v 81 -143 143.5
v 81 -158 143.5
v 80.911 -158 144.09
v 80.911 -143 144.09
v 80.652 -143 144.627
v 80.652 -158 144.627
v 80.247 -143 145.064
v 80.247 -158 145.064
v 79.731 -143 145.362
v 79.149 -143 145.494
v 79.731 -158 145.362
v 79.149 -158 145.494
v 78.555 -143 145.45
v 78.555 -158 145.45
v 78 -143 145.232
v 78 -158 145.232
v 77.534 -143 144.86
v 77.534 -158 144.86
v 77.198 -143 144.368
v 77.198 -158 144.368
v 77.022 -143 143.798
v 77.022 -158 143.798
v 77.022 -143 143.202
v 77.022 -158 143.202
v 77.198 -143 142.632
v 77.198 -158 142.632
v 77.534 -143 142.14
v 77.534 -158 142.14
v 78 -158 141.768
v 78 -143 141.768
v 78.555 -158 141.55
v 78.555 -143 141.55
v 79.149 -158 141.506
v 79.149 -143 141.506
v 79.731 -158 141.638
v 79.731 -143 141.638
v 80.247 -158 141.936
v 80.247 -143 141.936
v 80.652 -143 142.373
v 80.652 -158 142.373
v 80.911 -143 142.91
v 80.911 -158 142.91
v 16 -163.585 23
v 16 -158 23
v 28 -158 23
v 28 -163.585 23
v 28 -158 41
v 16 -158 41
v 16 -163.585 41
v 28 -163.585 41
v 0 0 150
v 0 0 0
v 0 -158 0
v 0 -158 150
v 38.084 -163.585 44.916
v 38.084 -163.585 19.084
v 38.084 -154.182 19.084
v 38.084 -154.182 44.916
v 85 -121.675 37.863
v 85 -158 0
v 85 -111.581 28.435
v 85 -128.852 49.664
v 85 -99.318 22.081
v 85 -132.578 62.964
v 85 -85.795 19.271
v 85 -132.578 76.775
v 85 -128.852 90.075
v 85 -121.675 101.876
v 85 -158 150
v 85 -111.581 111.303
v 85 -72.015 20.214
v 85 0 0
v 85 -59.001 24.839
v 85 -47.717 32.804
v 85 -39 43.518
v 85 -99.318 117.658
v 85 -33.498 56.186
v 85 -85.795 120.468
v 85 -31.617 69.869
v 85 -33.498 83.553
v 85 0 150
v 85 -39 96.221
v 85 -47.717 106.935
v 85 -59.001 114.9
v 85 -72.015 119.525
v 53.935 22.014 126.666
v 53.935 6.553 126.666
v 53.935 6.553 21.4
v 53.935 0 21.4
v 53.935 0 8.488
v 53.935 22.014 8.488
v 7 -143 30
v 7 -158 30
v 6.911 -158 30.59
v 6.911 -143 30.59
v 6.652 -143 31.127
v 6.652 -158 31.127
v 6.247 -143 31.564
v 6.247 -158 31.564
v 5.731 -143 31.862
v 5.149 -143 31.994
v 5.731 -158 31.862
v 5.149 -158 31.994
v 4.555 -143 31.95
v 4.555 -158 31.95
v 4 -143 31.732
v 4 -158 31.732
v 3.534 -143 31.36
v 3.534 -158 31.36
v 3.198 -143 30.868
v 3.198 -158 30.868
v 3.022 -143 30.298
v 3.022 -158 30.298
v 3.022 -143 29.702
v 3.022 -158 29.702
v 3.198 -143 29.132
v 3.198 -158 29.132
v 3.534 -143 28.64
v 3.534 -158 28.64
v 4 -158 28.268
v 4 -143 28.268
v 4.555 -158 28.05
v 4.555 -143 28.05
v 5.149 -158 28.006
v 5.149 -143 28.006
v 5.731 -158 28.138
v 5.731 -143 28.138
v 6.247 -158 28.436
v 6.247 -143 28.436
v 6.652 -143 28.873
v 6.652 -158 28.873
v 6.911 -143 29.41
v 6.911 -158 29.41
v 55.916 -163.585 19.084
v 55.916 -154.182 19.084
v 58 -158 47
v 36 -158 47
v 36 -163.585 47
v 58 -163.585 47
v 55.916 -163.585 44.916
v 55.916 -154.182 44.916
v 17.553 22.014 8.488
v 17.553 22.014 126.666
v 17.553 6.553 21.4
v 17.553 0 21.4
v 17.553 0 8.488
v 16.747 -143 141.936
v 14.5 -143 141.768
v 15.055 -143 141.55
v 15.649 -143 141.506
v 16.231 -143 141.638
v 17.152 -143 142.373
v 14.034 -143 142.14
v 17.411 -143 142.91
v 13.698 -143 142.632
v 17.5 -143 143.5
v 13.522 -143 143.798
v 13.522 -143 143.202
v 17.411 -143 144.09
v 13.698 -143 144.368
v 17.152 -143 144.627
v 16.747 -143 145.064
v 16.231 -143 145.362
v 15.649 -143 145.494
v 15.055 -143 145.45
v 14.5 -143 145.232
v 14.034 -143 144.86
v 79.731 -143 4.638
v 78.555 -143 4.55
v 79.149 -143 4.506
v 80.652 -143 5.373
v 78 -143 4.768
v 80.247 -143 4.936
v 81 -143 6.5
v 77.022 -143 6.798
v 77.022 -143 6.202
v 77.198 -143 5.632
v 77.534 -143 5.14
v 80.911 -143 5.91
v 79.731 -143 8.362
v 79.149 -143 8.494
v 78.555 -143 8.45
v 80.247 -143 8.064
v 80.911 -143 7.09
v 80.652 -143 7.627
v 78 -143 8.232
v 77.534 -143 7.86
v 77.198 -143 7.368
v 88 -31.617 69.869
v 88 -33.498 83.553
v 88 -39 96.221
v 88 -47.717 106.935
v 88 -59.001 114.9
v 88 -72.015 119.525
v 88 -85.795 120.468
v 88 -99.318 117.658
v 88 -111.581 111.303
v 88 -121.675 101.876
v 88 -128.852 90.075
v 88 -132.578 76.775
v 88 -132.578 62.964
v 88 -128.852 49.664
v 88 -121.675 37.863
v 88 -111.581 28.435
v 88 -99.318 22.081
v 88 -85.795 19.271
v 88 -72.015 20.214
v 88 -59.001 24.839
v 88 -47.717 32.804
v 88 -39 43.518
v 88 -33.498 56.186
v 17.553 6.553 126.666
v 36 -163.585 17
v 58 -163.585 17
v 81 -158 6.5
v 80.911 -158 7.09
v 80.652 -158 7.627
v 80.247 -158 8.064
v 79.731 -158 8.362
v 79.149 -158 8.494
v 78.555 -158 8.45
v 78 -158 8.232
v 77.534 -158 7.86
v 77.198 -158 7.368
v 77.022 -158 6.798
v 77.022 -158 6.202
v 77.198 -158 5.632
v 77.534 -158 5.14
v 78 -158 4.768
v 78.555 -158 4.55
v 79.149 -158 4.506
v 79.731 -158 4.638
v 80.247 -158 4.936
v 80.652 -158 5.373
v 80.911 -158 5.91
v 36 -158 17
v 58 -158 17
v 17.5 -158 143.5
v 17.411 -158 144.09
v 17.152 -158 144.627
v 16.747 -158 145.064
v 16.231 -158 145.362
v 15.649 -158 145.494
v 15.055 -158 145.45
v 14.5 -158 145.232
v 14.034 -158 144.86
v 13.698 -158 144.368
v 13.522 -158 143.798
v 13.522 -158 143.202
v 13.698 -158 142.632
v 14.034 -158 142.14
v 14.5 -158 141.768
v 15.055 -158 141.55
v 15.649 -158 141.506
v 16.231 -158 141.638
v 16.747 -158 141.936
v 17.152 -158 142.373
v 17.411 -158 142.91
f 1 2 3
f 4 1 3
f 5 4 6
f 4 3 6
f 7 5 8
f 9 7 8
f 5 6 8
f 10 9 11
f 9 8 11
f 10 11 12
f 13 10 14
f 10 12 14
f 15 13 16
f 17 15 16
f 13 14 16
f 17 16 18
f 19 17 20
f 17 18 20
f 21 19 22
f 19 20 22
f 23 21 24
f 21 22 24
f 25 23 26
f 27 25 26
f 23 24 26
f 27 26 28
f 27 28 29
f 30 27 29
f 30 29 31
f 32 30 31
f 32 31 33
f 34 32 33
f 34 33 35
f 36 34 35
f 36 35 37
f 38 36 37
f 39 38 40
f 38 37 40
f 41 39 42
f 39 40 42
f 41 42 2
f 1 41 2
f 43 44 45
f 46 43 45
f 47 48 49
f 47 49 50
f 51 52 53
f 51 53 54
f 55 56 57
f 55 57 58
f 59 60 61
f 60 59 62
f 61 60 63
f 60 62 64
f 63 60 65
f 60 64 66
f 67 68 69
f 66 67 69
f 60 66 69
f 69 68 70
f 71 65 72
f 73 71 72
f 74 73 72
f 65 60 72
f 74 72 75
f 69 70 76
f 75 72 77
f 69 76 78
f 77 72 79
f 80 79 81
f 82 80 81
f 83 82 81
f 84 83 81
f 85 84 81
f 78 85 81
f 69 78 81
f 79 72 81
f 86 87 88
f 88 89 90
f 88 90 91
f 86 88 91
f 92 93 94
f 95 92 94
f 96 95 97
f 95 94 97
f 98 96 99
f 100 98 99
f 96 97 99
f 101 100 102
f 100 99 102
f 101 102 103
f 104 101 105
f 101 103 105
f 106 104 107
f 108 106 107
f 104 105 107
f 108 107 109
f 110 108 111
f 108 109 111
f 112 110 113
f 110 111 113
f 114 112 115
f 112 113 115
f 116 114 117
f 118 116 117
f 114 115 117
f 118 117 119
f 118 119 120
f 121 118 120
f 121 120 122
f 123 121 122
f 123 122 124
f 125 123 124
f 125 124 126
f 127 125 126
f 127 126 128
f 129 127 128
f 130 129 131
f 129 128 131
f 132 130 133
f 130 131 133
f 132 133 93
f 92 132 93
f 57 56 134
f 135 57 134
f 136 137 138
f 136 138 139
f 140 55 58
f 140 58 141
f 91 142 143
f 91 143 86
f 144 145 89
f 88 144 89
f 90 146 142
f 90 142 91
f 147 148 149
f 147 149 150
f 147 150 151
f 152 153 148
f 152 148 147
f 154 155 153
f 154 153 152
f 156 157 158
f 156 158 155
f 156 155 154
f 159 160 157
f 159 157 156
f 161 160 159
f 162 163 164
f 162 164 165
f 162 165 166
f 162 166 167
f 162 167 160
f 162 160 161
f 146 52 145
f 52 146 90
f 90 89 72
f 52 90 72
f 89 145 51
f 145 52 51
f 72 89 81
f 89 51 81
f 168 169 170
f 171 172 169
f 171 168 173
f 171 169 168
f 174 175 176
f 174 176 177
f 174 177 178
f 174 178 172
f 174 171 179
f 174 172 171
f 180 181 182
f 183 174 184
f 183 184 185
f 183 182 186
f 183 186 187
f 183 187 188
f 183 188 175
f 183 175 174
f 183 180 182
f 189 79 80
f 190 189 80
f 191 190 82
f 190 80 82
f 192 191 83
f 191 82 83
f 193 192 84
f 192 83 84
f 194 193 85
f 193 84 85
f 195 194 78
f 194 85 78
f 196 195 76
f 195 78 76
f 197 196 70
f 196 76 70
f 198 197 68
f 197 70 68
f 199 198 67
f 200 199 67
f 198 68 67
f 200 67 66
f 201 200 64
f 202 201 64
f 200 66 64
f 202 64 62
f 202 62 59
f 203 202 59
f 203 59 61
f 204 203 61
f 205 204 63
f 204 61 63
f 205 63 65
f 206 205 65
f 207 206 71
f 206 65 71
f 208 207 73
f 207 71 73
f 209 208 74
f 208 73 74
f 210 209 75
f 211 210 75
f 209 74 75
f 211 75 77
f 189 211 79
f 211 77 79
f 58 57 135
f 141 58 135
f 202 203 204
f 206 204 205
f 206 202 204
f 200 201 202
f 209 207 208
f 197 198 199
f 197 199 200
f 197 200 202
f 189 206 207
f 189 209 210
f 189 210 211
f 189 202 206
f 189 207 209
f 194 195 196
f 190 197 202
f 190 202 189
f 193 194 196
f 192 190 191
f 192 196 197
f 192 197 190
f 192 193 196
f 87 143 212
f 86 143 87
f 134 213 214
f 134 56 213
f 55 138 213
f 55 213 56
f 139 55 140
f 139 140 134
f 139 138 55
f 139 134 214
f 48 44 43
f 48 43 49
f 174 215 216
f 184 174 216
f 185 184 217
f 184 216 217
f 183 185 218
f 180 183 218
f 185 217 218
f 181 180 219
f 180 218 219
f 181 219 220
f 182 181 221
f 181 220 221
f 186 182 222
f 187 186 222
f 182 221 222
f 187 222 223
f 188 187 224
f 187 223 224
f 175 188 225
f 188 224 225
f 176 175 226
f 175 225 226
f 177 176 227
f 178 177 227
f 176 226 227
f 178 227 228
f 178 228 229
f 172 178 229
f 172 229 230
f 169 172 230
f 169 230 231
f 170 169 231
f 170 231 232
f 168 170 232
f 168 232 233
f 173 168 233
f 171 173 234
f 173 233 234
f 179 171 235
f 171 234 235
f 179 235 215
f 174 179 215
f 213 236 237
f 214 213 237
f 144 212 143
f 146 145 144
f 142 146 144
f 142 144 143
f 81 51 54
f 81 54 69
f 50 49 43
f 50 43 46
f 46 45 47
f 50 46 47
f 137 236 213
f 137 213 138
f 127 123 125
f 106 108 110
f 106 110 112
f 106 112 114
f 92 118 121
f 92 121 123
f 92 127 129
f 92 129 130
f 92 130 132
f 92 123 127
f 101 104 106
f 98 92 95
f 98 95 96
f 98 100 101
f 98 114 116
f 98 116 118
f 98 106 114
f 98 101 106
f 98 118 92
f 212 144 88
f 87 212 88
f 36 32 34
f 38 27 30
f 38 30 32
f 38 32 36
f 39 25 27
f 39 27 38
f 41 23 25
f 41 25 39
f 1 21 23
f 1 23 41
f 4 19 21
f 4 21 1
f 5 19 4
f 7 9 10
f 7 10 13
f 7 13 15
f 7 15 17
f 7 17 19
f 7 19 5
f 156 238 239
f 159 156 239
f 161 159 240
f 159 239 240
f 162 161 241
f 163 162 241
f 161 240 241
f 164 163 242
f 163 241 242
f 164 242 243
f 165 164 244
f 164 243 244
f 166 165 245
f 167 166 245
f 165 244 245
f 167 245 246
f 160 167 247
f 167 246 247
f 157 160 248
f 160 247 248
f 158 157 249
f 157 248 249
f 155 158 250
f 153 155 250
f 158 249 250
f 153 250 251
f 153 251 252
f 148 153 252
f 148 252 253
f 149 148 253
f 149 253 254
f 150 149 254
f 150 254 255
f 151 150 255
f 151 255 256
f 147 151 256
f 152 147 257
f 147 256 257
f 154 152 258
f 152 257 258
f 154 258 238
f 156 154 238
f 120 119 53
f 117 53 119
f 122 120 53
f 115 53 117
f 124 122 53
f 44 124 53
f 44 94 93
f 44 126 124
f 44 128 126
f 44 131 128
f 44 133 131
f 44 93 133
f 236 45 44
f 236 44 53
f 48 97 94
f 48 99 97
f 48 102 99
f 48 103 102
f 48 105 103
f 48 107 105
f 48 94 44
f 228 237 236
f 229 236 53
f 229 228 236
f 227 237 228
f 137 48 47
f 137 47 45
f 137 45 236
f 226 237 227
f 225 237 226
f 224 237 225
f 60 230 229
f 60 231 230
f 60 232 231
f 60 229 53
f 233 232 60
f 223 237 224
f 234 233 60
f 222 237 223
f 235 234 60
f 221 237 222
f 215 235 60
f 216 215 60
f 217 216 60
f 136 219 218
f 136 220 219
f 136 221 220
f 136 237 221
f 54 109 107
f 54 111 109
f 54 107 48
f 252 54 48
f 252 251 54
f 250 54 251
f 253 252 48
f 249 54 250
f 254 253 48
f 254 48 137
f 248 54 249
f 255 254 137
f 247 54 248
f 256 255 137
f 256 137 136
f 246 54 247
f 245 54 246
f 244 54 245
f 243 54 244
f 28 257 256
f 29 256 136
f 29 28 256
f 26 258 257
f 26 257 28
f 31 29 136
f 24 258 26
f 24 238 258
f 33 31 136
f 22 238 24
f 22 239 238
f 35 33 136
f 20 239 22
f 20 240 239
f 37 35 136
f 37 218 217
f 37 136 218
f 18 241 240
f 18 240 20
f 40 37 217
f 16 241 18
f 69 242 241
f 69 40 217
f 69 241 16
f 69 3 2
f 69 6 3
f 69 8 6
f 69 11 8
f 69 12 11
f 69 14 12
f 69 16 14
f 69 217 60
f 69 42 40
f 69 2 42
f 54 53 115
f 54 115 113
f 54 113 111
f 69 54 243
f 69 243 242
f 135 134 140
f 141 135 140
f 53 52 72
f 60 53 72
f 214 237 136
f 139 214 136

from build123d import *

# Parameters (mm, degrees)
F0_W      = 85
F0_H      = 150
F0_R      = 2
F1_DEPTH  = 158
F2_R      = 2
F3_DEPTH  = 15
F4_W      = 12
F4_H      = 18
F4_W_2    = 22
F4_H_2    = 30
F5_DEPTH  = 5.58503
F6_W      = 17.8319794536
F6_H      = 25.8319794536
F7_DEPTH  = 9.40301
F8_R      = 50.7166992879
F9_DEPTH  = 3
F10_W     = 36.3819319755
F10_H     = 12.9120806232
F11_DEPTH = 22.01429
F12_W     = 36.3819319755
F12_H     = 15.4613213601
F13_DEPTH = 105.26626


with BuildPart() as f1:
    # F0 (on Front) → F1 (new body)
    with BuildSketch(Plane.XZ):
        with Locations((42.5, 75)):
            Rectangle(F0_W, F0_H)
        with Locations((5, 30)):
            Circle(F0_R, mode=Mode.SUBTRACT)
        with Locations((79, 6.5)):
            Circle(F0_R, mode=Mode.SUBTRACT)
        with Locations((15.5, 143.5)):
            Circle(F0_R, mode=Mode.SUBTRACT)
        with Locations((79, 143.5)):
            Circle(F0_R, mode=Mode.SUBTRACT)
        with Locations((15.5, 143.5)):
            Circle(F0_R)
        with Locations((79, 143.5)):
            Circle(F0_R)
        with Locations((79, 6.5)):
            Circle(F0_R)
        with Locations((5, 30)):
            Circle(F0_R)
    extrude(amount=F1_DEPTH)

    # F2 (on face) → F3 (cut)
    with BuildSketch(Plane.XZ.offset(158)):
        with Locations((79, 6.5)):
            Circle(F2_R)
        with Locations((5, 30)):
            Circle(F2_R)
        with Locations((15.5, 143.5)):
            Circle(F2_R)
        with Locations((79, 143.5)):
            Circle(F2_R)
    extrude(amount=-F3_DEPTH, mode=Mode.SUBTRACT)

    # F4 (on face) → F5 (join)
    with BuildSketch(Plane.XZ.offset(158)):
        with Locations((22, 32)):
            Rectangle(F4_W, F4_H)
        with Locations((47, 32)):
            Rectangle(F4_W_2, F4_H_2)
    extrude(amount=F5_DEPTH)

    # F6 (on face) → F7 (cut)
    with BuildSketch(Plane.XZ.offset(163.58503)):
        with Locations((47, 32)):
            Rectangle(F6_W, F6_H)
    extrude(amount=-F7_DEPTH, mode=Mode.SUBTRACT)

    # F8 (on face) → F9 (join)
    with BuildSketch(Plane.YZ.offset(85)):
        with Locations((-82.3336839676, 69.8694512248)):
            Circle(F8_R)
    extrude(amount=F9_DEPTH)

    # F10 (on face) → F11 (join)
    with BuildSketch(Plane.XZ):
        with Locations((35.7437124476, 14.9440853857)):
            Rectangle(F10_W, F10_H)
    extrude(amount=-F11_DEPTH)

    # F12 (on face) → F13 (join)
    with BuildSketch(Plane.XY.offset(21.4001256973)):
        with Locations((35.7437124476, 14.2836293199)):
            Rectangle(F12_W, F12_H)
    extrude(amount=F13_DEPTH)


solid = f1.part
